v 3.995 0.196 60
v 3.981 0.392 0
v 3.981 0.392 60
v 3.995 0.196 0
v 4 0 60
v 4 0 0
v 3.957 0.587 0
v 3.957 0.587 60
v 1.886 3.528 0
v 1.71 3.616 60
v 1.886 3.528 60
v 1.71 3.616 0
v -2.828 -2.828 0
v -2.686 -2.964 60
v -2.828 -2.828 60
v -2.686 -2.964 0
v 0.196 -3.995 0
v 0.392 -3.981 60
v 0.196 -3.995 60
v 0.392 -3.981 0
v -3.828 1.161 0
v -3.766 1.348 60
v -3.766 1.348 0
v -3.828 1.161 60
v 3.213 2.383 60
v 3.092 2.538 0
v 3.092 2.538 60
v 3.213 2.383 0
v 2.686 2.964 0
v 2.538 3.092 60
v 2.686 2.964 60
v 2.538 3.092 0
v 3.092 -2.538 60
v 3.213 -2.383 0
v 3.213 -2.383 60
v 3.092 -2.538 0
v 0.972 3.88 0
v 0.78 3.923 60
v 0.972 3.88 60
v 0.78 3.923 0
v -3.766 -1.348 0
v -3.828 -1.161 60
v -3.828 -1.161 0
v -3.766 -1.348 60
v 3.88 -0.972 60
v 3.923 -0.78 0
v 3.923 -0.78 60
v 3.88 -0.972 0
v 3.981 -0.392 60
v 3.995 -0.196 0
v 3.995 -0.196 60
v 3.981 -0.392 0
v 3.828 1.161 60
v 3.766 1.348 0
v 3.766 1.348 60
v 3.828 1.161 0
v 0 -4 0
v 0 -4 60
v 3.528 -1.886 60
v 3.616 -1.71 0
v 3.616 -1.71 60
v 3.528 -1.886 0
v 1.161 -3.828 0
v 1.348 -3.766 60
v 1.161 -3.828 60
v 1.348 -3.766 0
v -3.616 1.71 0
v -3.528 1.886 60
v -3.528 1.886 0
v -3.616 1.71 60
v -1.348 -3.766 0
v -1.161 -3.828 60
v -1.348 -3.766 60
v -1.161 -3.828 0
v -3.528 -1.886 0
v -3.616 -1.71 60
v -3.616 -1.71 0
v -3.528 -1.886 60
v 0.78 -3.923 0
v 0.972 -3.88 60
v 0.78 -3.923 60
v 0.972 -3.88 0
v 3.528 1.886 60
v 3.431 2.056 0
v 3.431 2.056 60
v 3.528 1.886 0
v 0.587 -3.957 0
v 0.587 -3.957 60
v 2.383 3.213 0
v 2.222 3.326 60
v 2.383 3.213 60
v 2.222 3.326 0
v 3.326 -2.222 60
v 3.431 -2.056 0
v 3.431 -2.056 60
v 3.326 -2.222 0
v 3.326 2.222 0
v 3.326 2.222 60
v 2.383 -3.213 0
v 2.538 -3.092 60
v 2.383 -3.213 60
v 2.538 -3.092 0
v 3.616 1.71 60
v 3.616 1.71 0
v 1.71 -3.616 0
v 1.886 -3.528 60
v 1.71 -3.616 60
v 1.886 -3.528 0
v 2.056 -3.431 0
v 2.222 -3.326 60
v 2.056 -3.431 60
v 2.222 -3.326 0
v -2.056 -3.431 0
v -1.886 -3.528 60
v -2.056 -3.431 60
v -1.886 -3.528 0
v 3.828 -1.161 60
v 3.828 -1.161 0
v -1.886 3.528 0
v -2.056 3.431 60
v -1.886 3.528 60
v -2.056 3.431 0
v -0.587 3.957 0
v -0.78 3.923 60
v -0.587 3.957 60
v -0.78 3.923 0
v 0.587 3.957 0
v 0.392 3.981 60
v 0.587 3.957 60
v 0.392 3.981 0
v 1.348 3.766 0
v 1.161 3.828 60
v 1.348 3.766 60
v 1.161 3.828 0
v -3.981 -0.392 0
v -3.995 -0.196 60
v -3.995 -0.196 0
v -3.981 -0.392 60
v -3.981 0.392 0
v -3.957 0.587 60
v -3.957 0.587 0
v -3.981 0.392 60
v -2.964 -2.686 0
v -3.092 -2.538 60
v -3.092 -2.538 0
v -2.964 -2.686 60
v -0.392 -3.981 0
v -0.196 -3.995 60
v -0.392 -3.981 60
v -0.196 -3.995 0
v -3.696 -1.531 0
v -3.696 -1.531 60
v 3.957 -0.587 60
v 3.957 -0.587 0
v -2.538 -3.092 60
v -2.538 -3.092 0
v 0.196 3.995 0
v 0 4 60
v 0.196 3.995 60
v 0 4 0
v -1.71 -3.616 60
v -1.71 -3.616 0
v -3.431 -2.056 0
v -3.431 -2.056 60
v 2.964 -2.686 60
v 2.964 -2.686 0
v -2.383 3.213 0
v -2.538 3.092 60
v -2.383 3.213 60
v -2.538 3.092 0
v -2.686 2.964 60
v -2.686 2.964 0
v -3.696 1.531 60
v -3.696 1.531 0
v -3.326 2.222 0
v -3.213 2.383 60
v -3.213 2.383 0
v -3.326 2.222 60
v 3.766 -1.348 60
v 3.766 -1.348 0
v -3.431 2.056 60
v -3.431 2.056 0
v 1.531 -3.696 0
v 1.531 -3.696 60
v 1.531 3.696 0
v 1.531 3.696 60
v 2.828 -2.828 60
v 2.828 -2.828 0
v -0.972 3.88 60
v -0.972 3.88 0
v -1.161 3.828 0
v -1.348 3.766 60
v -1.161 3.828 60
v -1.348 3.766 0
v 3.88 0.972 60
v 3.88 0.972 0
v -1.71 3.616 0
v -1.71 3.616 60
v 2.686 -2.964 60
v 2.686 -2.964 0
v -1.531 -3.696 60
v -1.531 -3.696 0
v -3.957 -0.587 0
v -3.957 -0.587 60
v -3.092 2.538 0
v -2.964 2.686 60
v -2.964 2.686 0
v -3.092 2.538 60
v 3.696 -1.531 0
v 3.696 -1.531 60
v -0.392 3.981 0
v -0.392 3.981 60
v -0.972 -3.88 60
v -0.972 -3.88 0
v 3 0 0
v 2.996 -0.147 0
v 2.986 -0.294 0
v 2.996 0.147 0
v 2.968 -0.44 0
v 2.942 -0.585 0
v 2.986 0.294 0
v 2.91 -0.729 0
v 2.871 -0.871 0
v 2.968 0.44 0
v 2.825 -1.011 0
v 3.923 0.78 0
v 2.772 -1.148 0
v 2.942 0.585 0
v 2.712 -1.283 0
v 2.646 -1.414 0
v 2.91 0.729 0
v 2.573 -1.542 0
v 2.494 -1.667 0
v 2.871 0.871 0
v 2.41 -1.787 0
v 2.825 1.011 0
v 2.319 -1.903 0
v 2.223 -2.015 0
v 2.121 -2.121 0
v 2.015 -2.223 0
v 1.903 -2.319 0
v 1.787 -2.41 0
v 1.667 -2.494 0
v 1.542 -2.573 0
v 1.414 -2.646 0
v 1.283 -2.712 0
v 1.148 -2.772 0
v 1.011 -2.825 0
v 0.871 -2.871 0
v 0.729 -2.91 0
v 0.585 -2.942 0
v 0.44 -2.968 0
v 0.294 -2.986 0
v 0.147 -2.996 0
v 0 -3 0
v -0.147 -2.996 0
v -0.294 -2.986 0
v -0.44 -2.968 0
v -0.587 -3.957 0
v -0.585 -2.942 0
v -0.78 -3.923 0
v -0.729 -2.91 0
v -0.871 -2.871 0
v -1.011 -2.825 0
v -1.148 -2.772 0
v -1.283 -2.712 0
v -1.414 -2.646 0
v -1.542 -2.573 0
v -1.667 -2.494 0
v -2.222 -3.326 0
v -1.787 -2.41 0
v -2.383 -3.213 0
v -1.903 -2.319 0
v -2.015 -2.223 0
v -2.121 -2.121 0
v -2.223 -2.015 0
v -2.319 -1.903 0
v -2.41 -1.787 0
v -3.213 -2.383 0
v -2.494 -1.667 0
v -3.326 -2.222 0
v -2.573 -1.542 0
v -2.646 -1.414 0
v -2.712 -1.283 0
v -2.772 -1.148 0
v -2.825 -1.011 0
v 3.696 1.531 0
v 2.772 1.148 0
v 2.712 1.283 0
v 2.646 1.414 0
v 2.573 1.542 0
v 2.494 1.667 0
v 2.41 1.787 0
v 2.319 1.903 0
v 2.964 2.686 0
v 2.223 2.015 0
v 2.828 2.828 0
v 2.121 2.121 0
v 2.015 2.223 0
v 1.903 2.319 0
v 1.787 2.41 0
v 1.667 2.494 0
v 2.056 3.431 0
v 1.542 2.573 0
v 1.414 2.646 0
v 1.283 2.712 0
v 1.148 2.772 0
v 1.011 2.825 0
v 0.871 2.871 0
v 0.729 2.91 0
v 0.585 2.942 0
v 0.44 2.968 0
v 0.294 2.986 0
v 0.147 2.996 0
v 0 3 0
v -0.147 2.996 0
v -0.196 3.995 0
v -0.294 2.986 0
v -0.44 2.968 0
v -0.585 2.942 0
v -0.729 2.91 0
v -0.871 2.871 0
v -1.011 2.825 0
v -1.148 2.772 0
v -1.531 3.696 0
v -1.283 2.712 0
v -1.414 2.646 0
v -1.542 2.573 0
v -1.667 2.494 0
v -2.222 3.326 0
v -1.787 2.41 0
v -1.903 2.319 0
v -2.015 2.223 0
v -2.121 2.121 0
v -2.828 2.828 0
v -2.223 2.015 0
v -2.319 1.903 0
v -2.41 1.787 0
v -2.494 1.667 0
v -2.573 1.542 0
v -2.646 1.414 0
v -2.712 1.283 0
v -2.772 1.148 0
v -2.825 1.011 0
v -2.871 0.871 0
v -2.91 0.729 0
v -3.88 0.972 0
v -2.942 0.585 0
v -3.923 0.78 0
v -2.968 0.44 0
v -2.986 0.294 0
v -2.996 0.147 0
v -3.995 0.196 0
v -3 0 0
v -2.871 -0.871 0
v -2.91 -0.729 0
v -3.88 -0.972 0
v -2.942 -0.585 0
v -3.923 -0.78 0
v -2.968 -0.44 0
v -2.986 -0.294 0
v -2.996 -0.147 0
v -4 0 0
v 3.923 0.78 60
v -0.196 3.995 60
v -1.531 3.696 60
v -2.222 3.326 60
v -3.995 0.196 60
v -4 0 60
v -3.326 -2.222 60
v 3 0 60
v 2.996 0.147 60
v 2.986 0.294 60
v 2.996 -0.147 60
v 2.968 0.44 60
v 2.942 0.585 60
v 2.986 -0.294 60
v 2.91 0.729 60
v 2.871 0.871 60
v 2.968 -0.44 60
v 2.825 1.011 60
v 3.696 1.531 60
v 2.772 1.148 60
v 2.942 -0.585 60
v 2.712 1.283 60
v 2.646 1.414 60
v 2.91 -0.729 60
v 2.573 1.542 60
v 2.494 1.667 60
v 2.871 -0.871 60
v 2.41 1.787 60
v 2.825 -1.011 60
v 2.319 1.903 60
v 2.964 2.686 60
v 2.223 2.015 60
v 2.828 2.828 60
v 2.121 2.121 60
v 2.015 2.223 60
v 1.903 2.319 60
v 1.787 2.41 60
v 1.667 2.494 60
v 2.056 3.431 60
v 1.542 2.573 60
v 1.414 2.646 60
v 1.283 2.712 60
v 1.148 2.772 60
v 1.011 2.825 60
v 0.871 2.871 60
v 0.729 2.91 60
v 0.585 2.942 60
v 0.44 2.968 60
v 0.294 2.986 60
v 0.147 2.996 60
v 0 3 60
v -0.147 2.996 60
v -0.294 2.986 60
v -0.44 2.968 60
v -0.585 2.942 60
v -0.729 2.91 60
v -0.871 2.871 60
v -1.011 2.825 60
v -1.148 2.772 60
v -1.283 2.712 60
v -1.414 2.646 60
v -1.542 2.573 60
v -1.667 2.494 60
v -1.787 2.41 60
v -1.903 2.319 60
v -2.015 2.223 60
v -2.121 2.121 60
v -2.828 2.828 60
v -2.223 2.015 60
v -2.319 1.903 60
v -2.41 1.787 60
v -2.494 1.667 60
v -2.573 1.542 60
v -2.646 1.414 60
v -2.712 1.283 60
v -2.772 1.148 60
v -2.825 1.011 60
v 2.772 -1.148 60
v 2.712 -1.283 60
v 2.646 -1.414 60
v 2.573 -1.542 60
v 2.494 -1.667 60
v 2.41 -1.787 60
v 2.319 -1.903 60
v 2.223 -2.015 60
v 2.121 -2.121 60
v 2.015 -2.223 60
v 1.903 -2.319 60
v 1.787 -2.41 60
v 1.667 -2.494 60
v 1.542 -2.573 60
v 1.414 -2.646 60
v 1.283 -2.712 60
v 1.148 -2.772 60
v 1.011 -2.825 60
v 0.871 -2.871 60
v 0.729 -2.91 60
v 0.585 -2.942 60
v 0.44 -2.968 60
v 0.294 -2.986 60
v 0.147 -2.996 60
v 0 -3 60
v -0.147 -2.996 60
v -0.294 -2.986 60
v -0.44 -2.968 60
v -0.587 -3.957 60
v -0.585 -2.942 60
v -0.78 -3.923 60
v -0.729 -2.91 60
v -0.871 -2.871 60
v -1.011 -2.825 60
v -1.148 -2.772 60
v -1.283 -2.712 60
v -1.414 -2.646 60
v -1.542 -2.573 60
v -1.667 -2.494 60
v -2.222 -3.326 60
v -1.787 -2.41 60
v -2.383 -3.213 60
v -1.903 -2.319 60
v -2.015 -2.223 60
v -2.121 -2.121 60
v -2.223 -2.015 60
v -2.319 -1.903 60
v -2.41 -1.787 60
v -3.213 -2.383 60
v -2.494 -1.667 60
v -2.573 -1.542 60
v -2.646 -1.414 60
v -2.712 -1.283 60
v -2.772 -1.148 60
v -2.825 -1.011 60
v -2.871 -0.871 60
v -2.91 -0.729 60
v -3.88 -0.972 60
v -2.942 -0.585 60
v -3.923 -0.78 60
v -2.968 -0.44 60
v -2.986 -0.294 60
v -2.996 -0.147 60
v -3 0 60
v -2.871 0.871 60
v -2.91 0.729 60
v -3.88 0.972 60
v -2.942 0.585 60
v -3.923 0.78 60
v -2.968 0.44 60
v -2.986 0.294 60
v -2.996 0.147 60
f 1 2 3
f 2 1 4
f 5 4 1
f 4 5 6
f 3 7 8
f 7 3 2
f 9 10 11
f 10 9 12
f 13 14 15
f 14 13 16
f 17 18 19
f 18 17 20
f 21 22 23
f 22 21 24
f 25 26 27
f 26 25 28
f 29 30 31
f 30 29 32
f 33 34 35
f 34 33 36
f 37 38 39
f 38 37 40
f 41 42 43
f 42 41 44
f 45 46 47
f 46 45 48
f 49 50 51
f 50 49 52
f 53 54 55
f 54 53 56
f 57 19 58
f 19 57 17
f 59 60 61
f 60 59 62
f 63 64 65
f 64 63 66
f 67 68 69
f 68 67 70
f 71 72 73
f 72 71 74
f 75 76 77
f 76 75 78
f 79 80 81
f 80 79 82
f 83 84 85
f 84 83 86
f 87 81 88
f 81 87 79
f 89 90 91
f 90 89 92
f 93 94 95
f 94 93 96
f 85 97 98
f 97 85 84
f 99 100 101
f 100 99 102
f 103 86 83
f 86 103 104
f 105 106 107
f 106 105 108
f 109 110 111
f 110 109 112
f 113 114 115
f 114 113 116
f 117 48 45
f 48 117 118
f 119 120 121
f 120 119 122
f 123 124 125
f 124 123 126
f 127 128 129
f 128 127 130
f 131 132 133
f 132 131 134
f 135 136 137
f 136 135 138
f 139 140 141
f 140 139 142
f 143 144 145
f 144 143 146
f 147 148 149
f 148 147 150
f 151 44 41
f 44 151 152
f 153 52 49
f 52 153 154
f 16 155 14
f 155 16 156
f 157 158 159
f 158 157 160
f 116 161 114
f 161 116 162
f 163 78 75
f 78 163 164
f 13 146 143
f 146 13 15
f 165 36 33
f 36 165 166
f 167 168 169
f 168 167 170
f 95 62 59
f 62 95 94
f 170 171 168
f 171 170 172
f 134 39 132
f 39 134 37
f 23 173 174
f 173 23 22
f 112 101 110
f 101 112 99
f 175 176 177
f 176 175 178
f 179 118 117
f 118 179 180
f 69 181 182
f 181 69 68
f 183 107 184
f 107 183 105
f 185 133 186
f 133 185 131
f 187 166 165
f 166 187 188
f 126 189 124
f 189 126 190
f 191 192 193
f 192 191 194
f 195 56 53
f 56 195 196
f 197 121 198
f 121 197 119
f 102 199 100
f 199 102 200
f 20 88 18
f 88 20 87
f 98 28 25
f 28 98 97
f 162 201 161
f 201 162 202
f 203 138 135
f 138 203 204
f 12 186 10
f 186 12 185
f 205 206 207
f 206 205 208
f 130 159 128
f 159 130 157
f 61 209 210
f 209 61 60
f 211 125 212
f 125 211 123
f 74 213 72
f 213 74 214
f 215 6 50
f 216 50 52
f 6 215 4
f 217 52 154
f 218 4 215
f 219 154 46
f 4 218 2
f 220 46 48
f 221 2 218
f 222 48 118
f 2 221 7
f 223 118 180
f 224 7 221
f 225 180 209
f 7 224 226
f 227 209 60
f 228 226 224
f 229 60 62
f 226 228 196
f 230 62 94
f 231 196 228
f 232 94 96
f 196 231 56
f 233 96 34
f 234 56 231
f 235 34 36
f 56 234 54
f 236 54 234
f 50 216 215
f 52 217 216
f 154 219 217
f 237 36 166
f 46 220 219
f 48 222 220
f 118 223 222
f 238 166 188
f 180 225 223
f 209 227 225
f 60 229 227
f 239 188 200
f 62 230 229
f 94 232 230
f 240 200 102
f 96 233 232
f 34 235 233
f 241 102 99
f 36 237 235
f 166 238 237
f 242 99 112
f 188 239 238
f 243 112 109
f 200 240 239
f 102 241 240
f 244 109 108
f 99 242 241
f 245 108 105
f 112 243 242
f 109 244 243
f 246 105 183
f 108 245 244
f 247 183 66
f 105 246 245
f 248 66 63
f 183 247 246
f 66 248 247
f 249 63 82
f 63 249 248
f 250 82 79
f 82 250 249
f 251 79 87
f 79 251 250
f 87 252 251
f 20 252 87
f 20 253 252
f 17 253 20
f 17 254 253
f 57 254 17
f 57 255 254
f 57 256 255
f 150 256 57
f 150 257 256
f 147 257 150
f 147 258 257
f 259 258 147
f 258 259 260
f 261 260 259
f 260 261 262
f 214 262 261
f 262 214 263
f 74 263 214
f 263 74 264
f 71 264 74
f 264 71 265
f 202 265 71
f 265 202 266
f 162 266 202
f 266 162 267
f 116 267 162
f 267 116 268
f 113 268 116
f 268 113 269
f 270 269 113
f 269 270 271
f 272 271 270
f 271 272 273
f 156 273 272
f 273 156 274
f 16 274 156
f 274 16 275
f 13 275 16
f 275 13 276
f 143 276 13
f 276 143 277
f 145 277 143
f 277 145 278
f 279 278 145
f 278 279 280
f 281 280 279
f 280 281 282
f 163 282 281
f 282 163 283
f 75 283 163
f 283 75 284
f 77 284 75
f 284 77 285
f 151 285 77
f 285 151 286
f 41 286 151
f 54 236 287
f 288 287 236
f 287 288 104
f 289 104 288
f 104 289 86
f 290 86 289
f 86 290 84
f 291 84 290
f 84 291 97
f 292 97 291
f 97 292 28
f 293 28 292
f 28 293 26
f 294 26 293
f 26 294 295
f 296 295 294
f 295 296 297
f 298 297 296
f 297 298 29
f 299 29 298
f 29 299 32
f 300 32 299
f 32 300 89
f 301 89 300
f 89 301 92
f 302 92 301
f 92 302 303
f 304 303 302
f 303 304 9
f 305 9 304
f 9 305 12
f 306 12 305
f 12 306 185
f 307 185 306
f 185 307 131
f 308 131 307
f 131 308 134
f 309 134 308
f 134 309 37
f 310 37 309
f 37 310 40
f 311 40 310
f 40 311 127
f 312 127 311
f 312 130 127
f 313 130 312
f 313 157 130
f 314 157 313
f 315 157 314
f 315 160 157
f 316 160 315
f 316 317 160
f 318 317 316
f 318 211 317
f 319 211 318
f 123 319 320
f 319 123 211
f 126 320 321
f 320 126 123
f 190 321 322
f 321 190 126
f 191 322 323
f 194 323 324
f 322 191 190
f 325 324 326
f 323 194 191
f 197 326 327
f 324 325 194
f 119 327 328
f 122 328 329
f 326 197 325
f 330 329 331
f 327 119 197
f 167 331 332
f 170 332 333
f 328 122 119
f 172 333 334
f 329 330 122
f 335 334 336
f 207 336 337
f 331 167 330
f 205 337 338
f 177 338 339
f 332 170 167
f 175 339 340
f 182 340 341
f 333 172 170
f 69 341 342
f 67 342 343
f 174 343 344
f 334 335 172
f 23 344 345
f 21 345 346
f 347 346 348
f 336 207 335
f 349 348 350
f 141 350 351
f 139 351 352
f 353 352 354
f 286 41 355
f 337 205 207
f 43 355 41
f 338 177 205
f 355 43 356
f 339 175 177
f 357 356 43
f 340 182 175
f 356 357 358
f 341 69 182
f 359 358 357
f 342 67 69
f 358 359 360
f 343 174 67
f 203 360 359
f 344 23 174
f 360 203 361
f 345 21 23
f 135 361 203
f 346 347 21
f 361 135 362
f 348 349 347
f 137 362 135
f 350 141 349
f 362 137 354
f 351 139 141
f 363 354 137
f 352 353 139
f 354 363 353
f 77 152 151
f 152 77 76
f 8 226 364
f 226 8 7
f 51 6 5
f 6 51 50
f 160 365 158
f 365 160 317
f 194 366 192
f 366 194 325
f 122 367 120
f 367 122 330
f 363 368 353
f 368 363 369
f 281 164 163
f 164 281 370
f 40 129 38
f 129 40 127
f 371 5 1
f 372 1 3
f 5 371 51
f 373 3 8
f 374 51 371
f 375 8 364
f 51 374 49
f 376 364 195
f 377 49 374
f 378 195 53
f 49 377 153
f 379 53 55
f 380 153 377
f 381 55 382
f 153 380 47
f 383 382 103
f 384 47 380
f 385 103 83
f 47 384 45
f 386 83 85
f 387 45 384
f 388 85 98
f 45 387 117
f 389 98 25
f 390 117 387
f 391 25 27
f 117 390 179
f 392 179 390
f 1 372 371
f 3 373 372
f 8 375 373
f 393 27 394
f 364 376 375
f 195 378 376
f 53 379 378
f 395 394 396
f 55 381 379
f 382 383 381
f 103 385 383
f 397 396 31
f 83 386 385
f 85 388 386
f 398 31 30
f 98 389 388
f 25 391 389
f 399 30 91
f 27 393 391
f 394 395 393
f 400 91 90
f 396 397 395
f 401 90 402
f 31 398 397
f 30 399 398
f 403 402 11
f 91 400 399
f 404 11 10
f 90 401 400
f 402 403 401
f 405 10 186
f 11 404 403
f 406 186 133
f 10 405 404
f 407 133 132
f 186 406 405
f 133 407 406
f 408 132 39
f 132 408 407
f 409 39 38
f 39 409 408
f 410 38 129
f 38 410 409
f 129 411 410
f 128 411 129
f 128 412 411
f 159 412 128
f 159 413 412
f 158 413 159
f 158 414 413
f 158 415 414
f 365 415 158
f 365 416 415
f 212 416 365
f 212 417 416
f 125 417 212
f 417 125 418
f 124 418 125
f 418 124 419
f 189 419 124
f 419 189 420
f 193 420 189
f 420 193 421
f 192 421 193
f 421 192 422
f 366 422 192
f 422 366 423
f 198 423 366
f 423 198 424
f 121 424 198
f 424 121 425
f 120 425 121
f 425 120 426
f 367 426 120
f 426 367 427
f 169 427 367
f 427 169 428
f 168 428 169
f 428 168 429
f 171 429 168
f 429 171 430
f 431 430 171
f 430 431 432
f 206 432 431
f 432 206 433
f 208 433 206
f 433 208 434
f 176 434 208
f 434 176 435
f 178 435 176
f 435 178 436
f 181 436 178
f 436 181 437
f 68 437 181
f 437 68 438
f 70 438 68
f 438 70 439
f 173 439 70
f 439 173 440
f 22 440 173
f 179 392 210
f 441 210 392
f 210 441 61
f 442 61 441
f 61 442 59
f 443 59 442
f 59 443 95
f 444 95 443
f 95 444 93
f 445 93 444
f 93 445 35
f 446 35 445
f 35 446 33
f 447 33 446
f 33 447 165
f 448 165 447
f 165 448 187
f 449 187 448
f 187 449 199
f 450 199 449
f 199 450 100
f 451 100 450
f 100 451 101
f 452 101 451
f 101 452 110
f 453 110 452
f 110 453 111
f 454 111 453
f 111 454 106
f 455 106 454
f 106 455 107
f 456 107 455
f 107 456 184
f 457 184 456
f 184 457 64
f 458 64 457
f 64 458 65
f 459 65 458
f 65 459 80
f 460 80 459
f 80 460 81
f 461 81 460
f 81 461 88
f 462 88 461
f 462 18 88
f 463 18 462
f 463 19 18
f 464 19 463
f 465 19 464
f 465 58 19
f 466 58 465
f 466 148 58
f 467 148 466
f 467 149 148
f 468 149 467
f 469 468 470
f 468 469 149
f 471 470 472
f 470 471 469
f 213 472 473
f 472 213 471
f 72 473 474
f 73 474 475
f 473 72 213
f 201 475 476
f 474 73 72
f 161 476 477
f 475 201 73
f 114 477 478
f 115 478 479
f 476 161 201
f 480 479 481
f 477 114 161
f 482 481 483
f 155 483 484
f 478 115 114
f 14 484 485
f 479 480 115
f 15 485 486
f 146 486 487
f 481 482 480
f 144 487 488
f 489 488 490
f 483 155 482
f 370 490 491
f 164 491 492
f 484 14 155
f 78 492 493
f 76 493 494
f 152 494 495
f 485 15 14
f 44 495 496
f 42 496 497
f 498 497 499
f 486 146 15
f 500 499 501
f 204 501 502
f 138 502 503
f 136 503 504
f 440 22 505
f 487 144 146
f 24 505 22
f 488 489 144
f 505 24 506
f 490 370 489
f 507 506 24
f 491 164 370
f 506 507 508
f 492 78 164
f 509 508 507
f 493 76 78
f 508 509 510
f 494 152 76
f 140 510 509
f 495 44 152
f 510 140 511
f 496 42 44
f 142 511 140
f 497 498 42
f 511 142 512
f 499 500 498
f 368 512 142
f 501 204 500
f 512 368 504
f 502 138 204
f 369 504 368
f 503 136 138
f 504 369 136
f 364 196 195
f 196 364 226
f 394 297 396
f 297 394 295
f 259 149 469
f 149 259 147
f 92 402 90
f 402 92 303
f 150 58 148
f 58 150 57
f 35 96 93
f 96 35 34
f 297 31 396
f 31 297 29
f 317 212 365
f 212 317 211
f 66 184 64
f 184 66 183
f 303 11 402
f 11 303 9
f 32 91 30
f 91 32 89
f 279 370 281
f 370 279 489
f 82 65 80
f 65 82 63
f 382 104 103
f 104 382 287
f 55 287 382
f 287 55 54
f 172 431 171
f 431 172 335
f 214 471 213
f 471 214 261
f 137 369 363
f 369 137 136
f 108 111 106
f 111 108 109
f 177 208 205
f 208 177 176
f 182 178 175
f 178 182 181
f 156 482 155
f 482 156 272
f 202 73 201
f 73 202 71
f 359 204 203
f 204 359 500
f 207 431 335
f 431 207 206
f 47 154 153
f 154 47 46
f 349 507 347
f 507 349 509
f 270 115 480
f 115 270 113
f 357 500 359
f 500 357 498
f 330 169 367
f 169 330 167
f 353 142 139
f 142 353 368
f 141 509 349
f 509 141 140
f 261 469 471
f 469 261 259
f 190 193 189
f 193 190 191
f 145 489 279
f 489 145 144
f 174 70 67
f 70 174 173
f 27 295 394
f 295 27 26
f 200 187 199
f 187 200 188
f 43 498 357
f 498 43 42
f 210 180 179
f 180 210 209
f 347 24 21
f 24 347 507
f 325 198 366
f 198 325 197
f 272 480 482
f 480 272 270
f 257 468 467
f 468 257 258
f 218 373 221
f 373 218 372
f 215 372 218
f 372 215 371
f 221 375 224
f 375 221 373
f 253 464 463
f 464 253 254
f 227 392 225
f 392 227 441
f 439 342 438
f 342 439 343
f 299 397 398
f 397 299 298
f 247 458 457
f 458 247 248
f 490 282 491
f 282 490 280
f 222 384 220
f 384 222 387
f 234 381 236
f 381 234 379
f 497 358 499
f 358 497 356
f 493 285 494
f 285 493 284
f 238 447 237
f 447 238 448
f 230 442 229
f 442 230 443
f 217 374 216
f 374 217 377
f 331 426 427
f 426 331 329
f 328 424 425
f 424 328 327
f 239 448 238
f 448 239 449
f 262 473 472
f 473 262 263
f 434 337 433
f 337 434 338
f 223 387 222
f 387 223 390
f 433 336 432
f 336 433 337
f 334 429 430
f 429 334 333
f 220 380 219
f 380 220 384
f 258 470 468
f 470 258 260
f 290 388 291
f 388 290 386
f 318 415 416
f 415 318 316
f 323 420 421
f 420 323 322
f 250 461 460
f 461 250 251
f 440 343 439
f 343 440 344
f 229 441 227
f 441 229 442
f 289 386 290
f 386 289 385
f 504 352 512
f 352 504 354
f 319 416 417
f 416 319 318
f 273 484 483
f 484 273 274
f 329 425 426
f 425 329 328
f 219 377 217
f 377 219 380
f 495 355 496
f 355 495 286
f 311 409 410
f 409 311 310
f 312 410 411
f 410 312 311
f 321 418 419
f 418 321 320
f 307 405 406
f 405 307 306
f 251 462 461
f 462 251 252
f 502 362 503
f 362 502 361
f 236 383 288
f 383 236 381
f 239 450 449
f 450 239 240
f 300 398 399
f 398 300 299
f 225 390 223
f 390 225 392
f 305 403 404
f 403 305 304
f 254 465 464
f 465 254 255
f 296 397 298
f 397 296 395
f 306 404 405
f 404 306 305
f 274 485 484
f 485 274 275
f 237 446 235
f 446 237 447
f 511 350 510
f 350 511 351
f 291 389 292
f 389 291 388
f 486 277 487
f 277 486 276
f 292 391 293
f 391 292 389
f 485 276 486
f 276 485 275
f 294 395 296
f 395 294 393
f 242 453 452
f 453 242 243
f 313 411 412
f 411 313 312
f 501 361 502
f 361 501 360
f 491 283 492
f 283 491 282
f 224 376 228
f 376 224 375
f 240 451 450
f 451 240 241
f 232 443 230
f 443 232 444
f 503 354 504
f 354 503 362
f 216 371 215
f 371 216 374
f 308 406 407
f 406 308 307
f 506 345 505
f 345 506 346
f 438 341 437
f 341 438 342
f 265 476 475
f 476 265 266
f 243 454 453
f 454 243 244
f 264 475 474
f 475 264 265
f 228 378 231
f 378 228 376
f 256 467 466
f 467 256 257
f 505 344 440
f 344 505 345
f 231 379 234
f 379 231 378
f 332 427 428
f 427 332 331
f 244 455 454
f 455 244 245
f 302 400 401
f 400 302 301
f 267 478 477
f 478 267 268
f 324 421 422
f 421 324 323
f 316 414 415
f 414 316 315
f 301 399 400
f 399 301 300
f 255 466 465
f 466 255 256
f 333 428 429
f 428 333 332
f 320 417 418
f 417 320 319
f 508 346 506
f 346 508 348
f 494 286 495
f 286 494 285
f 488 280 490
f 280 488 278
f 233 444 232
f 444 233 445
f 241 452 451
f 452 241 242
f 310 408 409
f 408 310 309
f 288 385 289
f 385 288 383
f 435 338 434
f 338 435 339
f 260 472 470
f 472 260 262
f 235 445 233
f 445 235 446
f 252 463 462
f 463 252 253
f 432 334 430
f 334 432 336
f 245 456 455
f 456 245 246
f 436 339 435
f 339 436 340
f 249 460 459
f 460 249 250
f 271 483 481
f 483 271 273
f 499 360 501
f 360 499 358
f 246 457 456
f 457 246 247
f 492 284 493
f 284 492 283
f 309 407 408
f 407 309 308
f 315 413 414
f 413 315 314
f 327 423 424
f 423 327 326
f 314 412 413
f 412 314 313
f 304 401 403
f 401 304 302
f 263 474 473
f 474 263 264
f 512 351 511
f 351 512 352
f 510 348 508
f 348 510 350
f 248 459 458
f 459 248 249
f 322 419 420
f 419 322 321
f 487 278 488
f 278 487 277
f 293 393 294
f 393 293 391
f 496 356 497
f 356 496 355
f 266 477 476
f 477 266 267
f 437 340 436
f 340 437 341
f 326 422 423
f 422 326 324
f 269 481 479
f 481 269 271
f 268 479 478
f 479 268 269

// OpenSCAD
$fn = 128;

// Heatshrink sleeving (tubing)
inner_d = 6;          // mm
wall = 1;             // mm
length = 60;          // mm

outer_d = inner_d + 2*wall;

difference() {
  cylinder(h = length, d = outer_d, center = false);
  translate([0,0,-0.1])
    cylinder(h = length + 0.2, d = inner_d, center = false);
}
